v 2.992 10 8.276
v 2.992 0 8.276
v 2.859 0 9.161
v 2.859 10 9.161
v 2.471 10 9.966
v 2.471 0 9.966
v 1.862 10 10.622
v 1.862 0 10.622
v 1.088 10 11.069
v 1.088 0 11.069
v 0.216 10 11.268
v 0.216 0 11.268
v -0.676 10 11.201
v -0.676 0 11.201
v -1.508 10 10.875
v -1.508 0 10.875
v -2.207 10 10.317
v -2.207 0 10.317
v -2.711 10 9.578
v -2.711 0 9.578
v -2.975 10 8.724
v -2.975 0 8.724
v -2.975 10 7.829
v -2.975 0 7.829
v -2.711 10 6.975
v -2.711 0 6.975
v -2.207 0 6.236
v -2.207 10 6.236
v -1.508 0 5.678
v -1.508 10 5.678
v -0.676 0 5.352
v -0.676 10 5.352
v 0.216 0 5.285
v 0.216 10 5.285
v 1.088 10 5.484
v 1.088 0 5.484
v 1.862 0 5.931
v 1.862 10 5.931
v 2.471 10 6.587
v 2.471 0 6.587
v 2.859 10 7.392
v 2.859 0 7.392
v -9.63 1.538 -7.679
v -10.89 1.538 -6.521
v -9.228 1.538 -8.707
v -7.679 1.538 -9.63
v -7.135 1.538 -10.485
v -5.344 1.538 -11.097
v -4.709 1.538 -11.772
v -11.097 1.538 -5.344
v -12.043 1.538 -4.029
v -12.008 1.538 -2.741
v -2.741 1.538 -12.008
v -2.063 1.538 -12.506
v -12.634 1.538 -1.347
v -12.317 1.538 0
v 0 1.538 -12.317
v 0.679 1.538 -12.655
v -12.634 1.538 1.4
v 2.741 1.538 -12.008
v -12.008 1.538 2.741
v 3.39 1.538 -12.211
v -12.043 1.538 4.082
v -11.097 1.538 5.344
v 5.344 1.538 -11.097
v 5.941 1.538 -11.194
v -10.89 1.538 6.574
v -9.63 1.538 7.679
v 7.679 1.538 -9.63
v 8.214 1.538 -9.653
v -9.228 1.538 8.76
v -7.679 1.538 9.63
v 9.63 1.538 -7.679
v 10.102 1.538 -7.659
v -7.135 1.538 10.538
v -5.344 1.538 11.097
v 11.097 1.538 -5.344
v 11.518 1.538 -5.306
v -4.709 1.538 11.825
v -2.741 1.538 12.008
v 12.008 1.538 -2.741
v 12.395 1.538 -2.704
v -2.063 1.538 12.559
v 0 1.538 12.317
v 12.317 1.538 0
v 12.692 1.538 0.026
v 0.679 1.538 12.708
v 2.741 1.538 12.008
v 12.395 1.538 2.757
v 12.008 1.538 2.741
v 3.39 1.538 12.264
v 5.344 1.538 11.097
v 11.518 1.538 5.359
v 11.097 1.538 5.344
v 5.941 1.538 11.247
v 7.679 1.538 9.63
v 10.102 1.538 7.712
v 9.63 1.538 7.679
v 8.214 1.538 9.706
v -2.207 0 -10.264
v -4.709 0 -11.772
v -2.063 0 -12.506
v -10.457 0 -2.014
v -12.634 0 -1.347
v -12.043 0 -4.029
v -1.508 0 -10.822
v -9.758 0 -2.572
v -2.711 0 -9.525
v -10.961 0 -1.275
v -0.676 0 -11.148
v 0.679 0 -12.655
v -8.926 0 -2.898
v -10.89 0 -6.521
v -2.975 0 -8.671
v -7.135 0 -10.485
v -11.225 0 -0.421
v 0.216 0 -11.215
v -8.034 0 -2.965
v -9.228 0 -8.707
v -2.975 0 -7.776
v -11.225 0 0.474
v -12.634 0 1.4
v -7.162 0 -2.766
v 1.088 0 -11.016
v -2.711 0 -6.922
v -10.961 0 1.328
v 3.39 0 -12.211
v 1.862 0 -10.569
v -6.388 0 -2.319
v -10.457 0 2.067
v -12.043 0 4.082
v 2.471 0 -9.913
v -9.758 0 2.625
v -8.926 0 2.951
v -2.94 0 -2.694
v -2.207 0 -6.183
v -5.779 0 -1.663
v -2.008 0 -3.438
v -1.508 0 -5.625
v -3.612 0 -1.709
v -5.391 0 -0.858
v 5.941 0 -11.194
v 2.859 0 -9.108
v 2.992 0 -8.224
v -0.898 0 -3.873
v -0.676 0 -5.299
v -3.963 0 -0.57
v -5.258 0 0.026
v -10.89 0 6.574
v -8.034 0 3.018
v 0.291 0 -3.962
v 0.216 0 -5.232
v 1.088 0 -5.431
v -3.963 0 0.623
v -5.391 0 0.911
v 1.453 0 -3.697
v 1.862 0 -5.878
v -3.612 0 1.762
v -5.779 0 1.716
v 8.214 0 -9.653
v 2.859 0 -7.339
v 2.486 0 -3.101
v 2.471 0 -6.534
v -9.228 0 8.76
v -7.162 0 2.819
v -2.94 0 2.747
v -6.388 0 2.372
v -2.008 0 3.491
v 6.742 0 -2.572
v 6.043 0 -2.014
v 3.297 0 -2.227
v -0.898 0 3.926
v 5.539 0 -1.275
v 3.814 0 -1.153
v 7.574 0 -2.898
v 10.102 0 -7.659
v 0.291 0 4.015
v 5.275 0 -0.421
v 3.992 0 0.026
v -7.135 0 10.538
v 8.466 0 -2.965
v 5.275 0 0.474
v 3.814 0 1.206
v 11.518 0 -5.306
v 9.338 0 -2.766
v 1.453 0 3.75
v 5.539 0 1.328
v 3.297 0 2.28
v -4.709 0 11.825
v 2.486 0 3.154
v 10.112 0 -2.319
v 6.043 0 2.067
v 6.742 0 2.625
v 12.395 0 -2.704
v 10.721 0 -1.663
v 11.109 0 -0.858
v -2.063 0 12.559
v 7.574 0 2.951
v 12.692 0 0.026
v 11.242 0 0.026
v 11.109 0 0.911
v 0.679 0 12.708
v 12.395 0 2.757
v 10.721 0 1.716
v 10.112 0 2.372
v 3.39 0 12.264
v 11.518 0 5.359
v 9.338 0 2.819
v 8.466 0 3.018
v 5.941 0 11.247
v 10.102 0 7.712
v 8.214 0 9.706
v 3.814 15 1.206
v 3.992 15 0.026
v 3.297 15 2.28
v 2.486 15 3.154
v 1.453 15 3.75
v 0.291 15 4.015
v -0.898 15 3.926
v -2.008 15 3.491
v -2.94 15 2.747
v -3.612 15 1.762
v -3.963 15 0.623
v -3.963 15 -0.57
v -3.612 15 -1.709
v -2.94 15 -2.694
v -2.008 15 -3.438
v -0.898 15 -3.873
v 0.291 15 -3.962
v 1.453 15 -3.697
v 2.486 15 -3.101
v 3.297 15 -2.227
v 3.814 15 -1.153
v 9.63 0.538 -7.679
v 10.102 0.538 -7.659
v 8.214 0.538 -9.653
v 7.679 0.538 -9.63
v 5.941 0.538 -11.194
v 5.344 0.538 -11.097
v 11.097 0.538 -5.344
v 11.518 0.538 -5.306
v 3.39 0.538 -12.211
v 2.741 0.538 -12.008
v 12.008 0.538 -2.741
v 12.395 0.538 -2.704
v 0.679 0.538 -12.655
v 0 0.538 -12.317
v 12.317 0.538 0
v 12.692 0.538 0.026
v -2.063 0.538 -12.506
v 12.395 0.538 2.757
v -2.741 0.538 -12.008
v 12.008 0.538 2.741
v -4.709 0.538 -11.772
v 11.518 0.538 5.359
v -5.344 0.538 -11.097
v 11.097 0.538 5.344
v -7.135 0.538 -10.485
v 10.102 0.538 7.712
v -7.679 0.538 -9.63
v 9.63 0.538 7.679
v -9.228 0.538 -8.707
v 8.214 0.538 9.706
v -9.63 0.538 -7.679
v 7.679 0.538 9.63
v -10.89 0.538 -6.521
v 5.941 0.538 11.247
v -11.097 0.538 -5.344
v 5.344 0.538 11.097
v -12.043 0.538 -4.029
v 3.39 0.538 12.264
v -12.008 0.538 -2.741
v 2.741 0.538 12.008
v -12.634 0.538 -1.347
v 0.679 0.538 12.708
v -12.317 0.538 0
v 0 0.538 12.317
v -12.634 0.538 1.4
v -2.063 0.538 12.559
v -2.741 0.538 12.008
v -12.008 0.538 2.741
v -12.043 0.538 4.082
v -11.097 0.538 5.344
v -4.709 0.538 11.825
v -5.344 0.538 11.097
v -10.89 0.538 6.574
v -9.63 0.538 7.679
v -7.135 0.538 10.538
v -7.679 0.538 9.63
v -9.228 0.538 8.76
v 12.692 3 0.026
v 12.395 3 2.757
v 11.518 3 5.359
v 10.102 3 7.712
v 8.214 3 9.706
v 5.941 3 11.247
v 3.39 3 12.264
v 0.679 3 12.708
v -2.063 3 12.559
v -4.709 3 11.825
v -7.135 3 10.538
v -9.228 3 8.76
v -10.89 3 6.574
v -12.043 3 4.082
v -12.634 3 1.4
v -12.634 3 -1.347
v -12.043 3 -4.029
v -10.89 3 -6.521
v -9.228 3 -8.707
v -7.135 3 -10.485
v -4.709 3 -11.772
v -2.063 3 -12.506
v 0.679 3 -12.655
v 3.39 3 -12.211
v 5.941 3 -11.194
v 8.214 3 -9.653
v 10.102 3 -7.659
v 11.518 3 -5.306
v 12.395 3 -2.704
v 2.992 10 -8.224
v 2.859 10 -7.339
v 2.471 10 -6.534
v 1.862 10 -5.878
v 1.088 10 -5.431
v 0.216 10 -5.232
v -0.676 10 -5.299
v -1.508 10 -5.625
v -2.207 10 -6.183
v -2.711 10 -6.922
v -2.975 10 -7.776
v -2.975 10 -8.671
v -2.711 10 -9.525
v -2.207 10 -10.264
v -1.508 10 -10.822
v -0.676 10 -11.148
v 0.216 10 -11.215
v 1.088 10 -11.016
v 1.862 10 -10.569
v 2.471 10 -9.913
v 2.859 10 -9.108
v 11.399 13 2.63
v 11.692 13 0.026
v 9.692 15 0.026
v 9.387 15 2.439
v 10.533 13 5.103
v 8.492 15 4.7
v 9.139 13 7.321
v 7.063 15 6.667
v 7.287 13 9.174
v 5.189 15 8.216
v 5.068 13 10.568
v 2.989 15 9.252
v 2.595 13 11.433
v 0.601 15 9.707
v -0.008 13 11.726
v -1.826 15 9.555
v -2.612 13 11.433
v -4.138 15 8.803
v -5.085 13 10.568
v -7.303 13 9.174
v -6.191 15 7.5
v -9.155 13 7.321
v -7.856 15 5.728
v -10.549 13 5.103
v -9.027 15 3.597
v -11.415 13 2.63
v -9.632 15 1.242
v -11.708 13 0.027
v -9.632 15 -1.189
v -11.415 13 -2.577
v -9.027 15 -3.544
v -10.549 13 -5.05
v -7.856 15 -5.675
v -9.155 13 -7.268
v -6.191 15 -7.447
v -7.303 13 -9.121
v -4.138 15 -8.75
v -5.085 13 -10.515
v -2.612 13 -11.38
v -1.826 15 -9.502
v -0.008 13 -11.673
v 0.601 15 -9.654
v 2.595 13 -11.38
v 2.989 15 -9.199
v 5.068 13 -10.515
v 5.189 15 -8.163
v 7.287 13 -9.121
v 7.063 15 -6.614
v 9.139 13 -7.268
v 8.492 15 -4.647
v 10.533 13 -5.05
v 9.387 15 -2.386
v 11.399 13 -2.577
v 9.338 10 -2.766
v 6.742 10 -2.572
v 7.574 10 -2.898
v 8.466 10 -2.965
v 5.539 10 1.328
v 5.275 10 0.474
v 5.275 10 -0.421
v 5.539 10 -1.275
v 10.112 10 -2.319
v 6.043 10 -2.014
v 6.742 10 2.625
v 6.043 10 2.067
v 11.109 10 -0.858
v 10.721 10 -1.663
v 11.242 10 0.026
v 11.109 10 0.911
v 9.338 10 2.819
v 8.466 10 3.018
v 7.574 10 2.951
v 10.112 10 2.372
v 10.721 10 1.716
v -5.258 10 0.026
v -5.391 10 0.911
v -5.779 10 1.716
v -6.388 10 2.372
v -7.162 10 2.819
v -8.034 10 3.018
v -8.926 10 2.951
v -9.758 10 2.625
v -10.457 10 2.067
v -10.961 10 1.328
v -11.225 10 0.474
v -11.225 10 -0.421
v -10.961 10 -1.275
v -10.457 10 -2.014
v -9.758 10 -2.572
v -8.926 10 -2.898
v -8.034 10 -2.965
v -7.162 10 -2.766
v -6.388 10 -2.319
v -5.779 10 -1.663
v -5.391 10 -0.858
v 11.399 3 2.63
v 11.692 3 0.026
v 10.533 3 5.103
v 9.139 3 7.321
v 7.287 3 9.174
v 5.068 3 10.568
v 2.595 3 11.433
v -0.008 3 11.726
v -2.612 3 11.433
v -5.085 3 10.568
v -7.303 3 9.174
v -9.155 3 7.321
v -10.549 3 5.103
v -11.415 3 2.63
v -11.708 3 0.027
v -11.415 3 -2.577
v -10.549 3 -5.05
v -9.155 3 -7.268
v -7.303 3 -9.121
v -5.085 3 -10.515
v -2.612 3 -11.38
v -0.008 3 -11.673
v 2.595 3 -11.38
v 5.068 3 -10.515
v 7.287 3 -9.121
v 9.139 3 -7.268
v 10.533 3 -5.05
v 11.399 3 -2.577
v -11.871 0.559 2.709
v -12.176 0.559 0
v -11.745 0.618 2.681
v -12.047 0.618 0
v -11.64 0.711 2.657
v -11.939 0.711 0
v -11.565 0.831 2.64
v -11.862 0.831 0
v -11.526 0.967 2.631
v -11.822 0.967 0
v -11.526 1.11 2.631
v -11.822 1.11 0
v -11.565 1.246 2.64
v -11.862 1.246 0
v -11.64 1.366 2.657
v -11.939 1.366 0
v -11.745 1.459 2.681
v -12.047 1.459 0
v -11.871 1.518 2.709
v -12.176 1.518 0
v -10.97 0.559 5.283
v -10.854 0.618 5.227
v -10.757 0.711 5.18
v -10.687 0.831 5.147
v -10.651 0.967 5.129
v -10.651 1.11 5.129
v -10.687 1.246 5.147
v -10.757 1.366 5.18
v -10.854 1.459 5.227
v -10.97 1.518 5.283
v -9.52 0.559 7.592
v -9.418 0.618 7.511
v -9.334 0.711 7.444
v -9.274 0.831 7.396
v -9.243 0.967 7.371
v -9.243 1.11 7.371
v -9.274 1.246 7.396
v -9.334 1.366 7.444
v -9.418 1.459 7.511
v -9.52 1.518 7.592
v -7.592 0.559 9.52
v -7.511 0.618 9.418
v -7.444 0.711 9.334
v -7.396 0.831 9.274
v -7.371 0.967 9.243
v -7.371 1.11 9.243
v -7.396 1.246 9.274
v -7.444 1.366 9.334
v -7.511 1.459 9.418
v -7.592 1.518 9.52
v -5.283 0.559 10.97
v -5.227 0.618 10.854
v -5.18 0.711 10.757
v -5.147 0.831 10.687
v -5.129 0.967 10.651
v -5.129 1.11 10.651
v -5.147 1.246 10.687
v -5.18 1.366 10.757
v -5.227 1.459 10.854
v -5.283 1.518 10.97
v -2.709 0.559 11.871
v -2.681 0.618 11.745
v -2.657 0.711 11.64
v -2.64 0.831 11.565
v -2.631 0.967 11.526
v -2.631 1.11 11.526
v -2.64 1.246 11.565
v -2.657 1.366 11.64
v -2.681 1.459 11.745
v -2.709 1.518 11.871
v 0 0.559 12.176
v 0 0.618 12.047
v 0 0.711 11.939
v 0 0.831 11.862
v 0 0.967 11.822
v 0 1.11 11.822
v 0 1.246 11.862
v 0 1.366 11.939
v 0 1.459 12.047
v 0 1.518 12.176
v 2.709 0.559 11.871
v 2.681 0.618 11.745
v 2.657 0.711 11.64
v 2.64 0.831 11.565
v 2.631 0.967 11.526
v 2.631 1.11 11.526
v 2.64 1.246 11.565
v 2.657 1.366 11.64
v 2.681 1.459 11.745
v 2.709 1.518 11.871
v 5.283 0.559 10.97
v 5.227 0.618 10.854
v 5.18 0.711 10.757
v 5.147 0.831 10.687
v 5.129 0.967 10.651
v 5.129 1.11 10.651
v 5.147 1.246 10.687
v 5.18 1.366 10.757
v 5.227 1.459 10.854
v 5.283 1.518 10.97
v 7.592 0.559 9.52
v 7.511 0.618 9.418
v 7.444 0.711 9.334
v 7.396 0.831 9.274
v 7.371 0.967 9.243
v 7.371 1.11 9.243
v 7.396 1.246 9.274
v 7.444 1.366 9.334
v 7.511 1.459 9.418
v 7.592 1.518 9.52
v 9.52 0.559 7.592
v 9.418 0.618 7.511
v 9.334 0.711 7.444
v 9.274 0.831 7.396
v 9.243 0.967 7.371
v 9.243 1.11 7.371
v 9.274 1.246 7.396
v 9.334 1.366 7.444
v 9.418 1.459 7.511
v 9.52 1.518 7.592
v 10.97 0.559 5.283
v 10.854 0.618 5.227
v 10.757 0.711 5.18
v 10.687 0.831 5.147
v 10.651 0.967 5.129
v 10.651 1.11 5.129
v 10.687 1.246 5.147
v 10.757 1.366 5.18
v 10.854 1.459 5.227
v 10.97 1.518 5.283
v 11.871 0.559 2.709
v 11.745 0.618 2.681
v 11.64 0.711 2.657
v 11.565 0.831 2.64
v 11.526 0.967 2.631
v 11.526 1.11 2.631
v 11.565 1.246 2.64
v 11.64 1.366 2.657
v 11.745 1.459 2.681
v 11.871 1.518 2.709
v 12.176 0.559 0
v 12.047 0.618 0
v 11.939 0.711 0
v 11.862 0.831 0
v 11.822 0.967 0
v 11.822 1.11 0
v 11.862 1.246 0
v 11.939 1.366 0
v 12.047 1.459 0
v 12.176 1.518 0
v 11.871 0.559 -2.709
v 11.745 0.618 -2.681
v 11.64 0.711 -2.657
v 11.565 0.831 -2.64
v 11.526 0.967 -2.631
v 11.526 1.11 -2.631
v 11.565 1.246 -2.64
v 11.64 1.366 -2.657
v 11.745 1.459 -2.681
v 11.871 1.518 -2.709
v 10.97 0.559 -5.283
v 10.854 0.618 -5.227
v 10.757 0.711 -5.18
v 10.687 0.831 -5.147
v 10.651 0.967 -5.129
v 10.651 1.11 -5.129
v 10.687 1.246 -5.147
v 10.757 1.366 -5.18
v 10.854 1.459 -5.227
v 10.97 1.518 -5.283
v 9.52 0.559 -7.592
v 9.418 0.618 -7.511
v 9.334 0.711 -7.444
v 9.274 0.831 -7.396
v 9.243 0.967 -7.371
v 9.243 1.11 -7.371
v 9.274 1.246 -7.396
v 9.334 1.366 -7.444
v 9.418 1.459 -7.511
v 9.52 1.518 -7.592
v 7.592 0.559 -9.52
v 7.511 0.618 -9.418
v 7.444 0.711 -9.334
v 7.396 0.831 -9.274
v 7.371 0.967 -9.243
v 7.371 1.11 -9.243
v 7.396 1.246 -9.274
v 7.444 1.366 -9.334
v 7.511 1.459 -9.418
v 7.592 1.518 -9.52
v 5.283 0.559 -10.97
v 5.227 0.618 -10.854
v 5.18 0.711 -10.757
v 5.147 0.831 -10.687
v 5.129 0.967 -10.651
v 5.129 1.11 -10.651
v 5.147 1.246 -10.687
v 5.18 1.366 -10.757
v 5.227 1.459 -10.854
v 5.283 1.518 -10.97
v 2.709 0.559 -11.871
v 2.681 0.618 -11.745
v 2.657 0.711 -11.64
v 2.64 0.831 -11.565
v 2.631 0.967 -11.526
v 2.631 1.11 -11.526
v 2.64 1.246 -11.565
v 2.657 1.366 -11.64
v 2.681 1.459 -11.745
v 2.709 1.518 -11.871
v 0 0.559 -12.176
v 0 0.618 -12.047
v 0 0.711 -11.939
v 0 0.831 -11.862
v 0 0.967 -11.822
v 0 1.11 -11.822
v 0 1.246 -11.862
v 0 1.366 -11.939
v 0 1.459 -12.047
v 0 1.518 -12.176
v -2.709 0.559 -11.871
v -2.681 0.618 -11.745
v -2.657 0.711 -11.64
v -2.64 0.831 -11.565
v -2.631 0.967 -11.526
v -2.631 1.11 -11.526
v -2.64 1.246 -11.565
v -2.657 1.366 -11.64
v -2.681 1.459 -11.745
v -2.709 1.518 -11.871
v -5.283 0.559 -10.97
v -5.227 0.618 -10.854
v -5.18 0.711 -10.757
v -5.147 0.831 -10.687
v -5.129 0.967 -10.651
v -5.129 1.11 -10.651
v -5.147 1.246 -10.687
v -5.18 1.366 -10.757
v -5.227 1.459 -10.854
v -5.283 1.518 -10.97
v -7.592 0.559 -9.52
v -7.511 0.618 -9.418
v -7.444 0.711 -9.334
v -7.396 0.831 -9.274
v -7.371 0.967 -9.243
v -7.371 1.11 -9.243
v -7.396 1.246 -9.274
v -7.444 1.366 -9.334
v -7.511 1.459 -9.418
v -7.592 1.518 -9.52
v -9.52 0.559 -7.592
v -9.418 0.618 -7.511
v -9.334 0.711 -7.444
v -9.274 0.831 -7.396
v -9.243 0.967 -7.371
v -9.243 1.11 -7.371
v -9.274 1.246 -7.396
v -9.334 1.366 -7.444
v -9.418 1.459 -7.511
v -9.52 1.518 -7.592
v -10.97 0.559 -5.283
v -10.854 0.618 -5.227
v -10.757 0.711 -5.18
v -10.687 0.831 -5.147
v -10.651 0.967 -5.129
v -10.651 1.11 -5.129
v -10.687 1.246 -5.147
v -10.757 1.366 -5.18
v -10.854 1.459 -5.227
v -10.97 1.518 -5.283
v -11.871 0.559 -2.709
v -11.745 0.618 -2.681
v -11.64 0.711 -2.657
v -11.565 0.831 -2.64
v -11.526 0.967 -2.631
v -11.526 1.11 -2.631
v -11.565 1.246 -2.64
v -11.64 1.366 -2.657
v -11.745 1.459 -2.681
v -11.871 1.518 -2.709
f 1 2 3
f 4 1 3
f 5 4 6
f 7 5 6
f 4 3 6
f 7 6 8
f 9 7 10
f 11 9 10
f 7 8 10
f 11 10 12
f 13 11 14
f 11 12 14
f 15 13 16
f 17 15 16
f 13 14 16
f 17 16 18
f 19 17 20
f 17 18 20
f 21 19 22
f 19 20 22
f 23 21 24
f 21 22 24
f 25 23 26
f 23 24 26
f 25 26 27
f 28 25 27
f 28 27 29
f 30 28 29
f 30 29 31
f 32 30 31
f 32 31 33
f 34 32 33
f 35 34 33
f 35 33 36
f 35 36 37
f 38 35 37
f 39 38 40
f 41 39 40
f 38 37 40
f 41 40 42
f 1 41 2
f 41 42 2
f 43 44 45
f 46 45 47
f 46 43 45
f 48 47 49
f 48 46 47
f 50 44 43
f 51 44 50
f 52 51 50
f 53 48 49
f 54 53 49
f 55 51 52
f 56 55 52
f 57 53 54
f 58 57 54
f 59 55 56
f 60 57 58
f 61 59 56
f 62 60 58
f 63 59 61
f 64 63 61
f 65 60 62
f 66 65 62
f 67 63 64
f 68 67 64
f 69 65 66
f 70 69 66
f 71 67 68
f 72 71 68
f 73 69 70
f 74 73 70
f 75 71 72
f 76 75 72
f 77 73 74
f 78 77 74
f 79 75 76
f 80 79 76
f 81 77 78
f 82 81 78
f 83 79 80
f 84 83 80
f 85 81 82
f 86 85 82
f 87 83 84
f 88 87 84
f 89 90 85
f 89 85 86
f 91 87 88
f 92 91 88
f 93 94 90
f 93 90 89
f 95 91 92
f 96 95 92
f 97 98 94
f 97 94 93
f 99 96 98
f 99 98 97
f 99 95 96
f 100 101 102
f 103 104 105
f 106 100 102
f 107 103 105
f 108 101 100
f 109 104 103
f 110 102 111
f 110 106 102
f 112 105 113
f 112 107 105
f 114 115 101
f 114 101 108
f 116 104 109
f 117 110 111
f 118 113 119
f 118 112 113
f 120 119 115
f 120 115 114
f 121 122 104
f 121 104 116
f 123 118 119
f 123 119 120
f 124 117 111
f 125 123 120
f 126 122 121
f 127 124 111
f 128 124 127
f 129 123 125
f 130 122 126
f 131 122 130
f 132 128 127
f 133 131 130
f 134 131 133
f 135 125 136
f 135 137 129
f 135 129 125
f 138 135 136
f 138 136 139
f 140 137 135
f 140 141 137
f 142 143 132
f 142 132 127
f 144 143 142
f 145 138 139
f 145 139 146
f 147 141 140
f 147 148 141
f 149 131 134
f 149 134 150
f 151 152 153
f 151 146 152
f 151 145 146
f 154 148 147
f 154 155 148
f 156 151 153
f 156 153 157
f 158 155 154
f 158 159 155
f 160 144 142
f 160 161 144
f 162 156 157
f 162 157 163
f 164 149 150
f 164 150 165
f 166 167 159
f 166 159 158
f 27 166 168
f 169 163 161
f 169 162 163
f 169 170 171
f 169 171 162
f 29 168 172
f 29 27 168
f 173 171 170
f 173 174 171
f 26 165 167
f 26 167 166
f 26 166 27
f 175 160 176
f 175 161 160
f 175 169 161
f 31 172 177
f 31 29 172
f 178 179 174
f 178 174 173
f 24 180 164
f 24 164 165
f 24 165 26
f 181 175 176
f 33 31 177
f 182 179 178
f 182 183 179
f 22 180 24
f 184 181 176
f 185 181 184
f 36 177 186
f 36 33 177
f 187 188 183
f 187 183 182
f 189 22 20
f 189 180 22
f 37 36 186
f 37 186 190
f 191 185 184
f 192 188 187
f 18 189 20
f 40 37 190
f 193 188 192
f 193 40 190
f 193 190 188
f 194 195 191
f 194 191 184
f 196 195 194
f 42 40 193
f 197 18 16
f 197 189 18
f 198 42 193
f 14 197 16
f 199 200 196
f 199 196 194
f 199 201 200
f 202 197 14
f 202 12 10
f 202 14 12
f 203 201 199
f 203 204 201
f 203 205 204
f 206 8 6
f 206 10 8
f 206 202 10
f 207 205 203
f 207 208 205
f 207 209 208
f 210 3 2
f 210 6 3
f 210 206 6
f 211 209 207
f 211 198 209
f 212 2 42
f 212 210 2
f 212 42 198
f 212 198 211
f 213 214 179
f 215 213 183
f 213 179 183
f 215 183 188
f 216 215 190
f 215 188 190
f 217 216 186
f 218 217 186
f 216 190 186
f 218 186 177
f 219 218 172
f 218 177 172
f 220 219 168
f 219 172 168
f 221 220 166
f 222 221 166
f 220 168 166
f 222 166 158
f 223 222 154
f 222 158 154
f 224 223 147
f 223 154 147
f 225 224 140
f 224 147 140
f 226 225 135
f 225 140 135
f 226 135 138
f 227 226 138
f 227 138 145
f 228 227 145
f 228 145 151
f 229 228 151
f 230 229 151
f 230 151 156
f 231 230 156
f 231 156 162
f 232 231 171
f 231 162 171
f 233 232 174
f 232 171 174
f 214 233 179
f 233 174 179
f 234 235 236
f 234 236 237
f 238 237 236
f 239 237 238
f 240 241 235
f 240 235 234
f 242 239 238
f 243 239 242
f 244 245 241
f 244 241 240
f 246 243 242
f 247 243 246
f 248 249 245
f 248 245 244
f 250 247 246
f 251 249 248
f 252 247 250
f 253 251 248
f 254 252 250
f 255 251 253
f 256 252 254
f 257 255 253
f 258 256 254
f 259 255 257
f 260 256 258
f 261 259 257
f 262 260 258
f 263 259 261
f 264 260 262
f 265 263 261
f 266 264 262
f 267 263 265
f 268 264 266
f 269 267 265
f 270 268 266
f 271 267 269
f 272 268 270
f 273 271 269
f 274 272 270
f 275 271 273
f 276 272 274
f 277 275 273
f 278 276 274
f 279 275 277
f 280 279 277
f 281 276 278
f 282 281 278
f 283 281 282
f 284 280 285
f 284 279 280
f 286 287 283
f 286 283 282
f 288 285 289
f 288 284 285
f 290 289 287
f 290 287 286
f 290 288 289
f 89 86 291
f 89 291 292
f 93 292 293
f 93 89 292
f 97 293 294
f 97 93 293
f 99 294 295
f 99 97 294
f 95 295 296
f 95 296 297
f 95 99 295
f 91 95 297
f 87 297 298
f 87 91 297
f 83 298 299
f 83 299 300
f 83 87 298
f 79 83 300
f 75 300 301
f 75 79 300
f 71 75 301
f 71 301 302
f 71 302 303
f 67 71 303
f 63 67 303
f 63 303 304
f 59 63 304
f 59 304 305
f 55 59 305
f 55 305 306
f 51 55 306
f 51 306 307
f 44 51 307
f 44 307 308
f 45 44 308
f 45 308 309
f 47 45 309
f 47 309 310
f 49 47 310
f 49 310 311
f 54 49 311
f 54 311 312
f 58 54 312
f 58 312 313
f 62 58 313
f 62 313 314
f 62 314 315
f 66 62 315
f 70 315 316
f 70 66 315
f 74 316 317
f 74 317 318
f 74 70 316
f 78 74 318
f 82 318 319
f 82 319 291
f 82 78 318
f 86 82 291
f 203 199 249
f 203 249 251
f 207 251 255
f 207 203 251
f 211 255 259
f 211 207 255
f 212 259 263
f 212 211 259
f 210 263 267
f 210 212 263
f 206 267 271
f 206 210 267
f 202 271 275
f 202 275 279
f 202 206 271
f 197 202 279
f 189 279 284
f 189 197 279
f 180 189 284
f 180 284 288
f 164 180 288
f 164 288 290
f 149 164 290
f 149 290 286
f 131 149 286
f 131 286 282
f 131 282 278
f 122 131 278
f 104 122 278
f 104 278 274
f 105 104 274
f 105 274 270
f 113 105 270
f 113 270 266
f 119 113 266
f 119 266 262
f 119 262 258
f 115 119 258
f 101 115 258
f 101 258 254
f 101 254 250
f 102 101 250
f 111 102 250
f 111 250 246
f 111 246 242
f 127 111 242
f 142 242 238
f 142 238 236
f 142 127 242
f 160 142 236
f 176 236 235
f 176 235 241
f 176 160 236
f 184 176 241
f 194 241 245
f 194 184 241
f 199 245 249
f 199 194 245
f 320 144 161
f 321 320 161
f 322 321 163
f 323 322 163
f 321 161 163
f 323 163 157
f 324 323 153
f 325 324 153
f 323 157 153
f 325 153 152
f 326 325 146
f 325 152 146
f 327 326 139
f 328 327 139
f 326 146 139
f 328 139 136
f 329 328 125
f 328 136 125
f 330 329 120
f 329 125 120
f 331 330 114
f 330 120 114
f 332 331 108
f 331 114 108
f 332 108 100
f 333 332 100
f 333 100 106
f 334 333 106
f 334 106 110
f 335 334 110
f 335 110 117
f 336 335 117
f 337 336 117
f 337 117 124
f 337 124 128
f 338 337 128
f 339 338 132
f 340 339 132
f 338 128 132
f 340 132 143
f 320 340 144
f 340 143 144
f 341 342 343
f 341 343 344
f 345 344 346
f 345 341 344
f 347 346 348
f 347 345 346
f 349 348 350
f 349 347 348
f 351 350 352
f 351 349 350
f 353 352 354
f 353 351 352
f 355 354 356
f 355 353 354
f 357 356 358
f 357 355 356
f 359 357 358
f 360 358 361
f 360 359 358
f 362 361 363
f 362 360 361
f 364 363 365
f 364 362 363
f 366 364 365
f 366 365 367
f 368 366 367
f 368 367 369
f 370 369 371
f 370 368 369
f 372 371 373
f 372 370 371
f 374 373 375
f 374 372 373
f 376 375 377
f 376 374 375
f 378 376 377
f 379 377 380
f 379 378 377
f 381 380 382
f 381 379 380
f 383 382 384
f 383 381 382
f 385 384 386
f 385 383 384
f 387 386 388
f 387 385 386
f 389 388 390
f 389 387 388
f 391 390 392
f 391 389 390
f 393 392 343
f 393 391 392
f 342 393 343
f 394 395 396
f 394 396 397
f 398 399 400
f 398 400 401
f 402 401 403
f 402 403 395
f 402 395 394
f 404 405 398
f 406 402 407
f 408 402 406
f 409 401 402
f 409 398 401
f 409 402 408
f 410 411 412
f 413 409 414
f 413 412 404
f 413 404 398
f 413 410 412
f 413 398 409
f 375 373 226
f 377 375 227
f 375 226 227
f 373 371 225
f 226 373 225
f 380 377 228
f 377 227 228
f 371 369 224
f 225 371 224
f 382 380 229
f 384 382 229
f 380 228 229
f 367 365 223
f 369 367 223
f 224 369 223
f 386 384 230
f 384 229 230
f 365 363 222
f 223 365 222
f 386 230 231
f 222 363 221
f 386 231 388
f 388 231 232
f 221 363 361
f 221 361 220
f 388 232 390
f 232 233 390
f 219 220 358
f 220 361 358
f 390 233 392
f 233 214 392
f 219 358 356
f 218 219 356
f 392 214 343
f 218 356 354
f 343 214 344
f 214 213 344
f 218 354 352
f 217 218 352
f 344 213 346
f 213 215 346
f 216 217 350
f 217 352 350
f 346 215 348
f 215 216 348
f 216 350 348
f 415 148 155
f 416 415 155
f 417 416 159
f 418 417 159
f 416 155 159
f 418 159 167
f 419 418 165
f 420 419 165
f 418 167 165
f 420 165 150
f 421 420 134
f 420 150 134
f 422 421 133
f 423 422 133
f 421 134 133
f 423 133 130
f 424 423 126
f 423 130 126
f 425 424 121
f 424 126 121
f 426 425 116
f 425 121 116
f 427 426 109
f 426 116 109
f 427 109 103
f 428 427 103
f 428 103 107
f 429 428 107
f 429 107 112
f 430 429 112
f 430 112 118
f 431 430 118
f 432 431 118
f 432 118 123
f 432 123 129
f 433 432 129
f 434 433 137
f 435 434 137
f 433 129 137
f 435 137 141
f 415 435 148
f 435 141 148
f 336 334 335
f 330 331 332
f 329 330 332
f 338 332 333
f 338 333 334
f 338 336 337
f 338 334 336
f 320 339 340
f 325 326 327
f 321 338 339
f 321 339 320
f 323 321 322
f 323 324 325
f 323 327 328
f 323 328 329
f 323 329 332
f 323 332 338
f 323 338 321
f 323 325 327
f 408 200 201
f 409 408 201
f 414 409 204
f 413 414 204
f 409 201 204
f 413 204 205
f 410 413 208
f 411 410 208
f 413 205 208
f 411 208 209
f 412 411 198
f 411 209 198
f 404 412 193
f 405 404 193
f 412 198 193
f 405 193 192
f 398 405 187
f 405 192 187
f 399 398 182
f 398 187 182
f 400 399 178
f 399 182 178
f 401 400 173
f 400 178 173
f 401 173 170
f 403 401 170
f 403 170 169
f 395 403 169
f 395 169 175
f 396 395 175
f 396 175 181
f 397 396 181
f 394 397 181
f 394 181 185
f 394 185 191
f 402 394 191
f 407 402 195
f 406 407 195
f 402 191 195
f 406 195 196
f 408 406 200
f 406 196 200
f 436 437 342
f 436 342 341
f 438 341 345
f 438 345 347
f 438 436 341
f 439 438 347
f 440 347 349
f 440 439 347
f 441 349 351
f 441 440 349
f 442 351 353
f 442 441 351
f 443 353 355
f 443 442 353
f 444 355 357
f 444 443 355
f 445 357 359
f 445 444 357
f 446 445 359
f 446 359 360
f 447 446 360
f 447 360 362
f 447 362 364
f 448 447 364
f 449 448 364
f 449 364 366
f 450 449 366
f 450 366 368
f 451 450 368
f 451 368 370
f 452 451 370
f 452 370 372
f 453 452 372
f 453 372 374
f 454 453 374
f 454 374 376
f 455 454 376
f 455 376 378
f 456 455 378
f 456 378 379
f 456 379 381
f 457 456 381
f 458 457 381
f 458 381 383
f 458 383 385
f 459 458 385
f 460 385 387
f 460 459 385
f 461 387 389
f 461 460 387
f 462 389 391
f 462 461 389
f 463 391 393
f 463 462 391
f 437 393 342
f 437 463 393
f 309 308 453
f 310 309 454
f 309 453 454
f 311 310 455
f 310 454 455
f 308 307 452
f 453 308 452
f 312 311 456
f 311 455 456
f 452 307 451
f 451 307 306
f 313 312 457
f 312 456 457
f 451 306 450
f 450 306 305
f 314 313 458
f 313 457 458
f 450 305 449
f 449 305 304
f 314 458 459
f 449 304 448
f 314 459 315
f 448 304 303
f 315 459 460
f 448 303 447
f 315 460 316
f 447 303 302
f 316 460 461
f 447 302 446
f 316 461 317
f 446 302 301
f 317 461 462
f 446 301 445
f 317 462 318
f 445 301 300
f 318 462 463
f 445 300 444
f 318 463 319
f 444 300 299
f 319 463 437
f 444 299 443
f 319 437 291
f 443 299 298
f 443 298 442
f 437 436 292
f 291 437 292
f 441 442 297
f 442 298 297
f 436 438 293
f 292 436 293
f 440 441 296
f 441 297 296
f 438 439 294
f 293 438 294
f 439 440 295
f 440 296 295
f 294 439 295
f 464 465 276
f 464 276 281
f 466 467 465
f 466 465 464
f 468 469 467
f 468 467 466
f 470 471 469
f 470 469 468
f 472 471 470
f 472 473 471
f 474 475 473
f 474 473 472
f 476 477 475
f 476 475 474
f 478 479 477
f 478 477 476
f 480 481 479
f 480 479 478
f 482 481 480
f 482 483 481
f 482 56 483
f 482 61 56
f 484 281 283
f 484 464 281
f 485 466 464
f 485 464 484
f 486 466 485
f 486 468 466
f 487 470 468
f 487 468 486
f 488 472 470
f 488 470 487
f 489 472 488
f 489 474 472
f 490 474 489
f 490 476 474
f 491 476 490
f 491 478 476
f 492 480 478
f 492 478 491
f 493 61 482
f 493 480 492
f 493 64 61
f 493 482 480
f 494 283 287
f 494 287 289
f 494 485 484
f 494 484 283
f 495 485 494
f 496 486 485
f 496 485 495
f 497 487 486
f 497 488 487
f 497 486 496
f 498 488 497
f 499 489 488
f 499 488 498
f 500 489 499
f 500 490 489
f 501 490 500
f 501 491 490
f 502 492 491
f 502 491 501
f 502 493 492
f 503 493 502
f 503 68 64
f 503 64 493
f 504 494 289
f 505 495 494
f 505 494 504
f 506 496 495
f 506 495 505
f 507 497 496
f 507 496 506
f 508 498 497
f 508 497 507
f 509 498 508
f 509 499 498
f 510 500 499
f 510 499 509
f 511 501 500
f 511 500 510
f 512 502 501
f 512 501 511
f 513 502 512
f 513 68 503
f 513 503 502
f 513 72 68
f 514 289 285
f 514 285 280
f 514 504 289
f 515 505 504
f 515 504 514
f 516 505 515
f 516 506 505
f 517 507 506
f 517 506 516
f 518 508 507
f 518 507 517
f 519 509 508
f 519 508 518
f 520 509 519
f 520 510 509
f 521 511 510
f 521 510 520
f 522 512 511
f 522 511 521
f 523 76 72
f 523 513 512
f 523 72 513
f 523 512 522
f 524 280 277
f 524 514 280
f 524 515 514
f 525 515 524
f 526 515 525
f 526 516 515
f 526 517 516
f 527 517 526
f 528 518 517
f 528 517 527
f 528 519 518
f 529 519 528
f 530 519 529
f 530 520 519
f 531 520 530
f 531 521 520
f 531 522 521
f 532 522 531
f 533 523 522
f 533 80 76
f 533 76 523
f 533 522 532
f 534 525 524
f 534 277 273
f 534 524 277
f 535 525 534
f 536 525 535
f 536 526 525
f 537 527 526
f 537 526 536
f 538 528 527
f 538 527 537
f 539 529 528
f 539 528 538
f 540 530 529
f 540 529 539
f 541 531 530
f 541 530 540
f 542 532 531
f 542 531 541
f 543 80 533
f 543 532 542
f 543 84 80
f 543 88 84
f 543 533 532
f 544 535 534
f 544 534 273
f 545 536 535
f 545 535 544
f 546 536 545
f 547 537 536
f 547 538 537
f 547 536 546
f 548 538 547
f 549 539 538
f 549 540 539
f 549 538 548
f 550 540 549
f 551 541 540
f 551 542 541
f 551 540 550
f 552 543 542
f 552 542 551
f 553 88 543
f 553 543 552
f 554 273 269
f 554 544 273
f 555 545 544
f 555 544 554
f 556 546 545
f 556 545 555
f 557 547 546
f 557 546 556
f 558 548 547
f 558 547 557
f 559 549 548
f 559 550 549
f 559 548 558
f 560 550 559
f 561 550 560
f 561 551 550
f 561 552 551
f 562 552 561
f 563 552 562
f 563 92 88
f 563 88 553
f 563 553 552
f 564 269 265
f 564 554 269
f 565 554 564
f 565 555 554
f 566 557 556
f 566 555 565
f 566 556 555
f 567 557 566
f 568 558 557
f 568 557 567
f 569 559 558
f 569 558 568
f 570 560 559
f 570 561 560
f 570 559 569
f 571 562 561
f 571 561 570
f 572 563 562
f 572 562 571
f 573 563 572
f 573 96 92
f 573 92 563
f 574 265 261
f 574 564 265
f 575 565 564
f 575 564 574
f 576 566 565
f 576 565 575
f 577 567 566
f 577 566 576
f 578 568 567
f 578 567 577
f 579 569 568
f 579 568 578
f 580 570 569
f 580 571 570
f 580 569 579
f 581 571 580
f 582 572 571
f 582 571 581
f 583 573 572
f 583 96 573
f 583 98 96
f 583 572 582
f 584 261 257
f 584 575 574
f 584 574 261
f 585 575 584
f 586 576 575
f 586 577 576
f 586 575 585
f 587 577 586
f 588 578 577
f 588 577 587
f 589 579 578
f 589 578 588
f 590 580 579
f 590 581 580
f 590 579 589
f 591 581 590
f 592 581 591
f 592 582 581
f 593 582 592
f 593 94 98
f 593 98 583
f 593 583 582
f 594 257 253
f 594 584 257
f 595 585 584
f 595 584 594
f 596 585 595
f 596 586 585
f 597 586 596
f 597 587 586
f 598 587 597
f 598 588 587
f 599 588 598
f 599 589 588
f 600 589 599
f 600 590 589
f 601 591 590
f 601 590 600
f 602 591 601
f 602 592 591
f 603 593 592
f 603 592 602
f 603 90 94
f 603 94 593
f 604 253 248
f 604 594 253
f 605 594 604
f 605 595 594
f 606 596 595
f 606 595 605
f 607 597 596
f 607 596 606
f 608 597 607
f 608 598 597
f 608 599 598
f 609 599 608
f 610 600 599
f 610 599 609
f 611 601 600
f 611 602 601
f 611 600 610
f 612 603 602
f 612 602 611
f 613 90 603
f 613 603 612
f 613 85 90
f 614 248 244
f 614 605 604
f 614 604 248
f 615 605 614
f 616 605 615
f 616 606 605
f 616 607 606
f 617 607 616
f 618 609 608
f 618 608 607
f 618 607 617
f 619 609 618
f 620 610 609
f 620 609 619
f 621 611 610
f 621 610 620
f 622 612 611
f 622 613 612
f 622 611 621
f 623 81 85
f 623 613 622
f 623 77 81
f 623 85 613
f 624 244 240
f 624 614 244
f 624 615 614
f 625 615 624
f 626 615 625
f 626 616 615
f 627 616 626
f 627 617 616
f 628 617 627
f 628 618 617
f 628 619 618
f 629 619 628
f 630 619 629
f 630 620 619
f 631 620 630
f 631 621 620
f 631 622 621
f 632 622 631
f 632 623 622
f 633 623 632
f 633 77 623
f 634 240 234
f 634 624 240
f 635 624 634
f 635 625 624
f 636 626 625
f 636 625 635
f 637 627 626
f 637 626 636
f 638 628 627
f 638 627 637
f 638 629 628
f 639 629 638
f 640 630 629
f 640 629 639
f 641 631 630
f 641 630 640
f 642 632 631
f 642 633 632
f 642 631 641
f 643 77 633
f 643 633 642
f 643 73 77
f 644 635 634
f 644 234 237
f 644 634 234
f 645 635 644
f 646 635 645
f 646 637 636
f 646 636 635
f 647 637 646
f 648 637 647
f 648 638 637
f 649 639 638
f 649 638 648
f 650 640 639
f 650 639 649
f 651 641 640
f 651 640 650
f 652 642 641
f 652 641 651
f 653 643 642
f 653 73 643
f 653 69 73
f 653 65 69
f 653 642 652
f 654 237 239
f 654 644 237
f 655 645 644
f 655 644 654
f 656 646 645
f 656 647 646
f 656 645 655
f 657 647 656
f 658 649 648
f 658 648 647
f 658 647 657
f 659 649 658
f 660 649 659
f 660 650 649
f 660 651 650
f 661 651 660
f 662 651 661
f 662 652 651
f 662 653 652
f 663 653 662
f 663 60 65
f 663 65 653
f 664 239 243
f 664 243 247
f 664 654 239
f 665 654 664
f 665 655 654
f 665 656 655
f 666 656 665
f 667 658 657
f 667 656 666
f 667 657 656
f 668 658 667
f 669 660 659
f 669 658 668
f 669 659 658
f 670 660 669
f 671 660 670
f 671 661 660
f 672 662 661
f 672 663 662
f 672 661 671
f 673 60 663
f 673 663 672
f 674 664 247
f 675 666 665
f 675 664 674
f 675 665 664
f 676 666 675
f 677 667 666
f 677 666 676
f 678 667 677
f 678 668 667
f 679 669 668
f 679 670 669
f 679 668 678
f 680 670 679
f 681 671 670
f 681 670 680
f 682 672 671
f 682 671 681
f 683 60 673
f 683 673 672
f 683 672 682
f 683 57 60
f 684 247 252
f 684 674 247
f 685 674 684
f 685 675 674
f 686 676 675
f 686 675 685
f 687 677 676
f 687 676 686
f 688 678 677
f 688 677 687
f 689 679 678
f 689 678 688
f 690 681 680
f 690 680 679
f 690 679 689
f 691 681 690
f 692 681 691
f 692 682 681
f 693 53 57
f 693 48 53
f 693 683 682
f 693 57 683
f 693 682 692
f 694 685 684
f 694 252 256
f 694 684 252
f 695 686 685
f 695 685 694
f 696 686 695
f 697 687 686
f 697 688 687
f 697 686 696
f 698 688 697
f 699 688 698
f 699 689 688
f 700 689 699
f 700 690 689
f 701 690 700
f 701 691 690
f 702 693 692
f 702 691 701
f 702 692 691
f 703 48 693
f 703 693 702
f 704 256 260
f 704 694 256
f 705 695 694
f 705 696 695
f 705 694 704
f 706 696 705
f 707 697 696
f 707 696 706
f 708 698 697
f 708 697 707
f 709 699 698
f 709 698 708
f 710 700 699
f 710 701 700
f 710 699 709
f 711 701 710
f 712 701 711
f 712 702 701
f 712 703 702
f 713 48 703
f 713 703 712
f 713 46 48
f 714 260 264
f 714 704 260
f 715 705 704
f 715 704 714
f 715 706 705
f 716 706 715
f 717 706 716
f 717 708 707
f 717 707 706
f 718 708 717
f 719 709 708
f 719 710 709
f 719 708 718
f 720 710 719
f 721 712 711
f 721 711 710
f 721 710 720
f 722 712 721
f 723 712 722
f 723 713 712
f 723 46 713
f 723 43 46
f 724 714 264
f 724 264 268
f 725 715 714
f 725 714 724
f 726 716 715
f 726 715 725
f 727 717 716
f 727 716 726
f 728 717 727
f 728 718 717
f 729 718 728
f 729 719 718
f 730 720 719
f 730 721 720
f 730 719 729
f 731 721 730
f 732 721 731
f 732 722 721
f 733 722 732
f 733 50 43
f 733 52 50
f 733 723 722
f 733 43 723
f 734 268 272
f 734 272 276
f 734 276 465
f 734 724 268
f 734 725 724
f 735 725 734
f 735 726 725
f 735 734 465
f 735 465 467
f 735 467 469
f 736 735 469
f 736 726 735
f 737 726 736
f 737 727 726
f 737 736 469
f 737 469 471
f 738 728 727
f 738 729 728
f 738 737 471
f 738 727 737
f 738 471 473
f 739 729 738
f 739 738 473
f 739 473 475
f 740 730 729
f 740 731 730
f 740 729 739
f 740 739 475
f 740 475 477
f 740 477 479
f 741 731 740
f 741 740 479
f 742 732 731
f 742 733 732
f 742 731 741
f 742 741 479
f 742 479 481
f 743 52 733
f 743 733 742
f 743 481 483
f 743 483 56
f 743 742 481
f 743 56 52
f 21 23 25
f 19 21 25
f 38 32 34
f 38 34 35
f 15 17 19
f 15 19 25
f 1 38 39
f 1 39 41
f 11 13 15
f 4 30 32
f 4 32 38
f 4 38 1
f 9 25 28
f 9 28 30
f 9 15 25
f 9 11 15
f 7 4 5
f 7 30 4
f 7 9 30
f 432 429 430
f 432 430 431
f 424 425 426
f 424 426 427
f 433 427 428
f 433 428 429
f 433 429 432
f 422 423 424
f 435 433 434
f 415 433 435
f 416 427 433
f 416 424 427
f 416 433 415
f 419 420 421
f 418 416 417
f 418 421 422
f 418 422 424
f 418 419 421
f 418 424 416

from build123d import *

# Parameters (mm, degrees)
F0_R     = 11.7
F0_R_2   = 3
F0_R_3   = 4
F0_R_4   = 12.7
F1_DEPTH = 3
F2_DEPTH = 15
F3_DEPTH = 10
F7_SIZE  = 2


with BuildPart() as f1:
    # F0 (on Front) → F1 (new body)
    with BuildSketch(Plane.XZ):
        with Locations((-0.008065, 0.0265)):
            Circle(F0_R)
        with Locations((-0.008065, -8.2235)):
            Circle(F0_R_2, mode=Mode.SUBTRACT)
        with Locations((-8.258065, 0.0265)):
            Circle(F0_R_2, mode=Mode.SUBTRACT)
        with Locations((-0.008065, 0.0265)):
            Circle(F0_R_3, mode=Mode.SUBTRACT)
        with Locations((8.241935, 0.0265)):
            Circle(F0_R_2, mode=Mode.SUBTRACT)
        with Locations((-0.008065, 8.2765)):
            Circle(F0_R_2, mode=Mode.SUBTRACT)
        with Locations((-0.008065, 0.0265)):
            Circle(F0_R_4)
        with Locations((-0.008065, 0.0265)):
            Circle(F0_R, mode=Mode.SUBTRACT)
        with Locations((-8.258065, 0.0265)):
            Circle(F0_R_2)
        with Locations((-0.008065, -8.2235)):
            Circle(F0_R_2)
        with Locations((8.241935, 0.0265)):
            Circle(F0_R_2)
        with Locations((-0.008065, 8.2765)):
            Circle(F0_R_2)
    extrude(amount=-F1_DEPTH)

    # F0 (on Front) → F2 (join)
    with BuildSketch(Plane.XZ):
        with Locations((-0.008065, 0.0265)):
            Circle(F0_R)
        with Locations((-0.008065, -8.2235)):
            Circle(F0_R_2, mode=Mode.SUBTRACT)
        with Locations((-8.258065, 0.0265)):
            Circle(F0_R_2, mode=Mode.SUBTRACT)
        with Locations((-0.008065, 0.0265)):
            Circle(F0_R_3, mode=Mode.SUBTRACT)
        with Locations((8.241935, 0.0265)):
            Circle(F0_R_2, mode=Mode.SUBTRACT)
        with Locations((-0.008065, 8.2765)):
            Circle(F0_R_2, mode=Mode.SUBTRACT)
        with Locations((-8.258065, 0.0265)):
            Circle(F0_R_2)
        with Locations((-0.008065, 8.2765)):
            Circle(F0_R_2)
        with Locations((8.241935, 0.0265)):
            Circle(F0_R_2)
        with Locations((-0.008065, -8.2235)):
            Circle(F0_R_2)
    extrude(amount=-F2_DEPTH)

    # F0 (on Front) → F3 (cut)
    with BuildSketch(Plane.XZ):
        with Locations((-8.258065, 0.0265)):
            Circle(F0_R_2)
        with Locations((-0.008065, 8.2765)):
            Circle(F0_R_2)
        with Locations((8.241935, 0.0265)):
            Circle(F0_R_2)
        with Locations((-0.008065, -8.2235)):
            Circle(F0_R_2)
    extrude(amount=-F3_DEPTH, mode=Mode.SUBTRACT)

    # F4 (on Top) → F5 (revolve, cut)
    with BuildSketch(Plane.XY):
        with BuildLine():
            Line((-13.744461, 0.538489), (-12.316881, 0.538489))
            ThreePointArc((-12.316881, 0.538489), (-11.816881, 1.038489), (-12.316881, 1.538489))
            Line((-12.316881, 1.538489), (-12.716881, 1.538489))
            Line((-12.716881, 1.538489), (-13.744461, 1.538489))
            Line((-13.744461, 1.538489), (-13.744461, 0.538489))
        make_face()
    revolve(axis=Axis((0, 1.278264, 0), (0, 1, 0)), mode=Mode.SUBTRACT)

    # F4 (on Top) → F6 (revolve, cut)
    with BuildSketch(Plane.XY):
        with BuildLine():
            Line((-13.744461, 0.538489), (-12.316881, 0.538489))
            ThreePointArc((-12.316881, 0.538489), (-11.816881, 1.038489), (-12.316881, 1.538489))
            Line((-12.316881, 1.538489), (-12.716881, 1.538489))
            Line((-12.716881, 1.538489), (-13.744461, 1.538489))
            Line((-13.744461, 1.538489), (-13.744461, 0.538489))
        make_face()
    revolve(axis=Axis((0, 1.278264, 0), (0, 1, 0)), mode=Mode.SUBTRACT)

    # F7
    f7_edges = [f1.edges().sort_by_distance(p)[0] for p in [
        (-11.708065, 15, 0.0265),
    ]]
    chamfer(f7_edges, length=F7_SIZE)


solid = f1.part
